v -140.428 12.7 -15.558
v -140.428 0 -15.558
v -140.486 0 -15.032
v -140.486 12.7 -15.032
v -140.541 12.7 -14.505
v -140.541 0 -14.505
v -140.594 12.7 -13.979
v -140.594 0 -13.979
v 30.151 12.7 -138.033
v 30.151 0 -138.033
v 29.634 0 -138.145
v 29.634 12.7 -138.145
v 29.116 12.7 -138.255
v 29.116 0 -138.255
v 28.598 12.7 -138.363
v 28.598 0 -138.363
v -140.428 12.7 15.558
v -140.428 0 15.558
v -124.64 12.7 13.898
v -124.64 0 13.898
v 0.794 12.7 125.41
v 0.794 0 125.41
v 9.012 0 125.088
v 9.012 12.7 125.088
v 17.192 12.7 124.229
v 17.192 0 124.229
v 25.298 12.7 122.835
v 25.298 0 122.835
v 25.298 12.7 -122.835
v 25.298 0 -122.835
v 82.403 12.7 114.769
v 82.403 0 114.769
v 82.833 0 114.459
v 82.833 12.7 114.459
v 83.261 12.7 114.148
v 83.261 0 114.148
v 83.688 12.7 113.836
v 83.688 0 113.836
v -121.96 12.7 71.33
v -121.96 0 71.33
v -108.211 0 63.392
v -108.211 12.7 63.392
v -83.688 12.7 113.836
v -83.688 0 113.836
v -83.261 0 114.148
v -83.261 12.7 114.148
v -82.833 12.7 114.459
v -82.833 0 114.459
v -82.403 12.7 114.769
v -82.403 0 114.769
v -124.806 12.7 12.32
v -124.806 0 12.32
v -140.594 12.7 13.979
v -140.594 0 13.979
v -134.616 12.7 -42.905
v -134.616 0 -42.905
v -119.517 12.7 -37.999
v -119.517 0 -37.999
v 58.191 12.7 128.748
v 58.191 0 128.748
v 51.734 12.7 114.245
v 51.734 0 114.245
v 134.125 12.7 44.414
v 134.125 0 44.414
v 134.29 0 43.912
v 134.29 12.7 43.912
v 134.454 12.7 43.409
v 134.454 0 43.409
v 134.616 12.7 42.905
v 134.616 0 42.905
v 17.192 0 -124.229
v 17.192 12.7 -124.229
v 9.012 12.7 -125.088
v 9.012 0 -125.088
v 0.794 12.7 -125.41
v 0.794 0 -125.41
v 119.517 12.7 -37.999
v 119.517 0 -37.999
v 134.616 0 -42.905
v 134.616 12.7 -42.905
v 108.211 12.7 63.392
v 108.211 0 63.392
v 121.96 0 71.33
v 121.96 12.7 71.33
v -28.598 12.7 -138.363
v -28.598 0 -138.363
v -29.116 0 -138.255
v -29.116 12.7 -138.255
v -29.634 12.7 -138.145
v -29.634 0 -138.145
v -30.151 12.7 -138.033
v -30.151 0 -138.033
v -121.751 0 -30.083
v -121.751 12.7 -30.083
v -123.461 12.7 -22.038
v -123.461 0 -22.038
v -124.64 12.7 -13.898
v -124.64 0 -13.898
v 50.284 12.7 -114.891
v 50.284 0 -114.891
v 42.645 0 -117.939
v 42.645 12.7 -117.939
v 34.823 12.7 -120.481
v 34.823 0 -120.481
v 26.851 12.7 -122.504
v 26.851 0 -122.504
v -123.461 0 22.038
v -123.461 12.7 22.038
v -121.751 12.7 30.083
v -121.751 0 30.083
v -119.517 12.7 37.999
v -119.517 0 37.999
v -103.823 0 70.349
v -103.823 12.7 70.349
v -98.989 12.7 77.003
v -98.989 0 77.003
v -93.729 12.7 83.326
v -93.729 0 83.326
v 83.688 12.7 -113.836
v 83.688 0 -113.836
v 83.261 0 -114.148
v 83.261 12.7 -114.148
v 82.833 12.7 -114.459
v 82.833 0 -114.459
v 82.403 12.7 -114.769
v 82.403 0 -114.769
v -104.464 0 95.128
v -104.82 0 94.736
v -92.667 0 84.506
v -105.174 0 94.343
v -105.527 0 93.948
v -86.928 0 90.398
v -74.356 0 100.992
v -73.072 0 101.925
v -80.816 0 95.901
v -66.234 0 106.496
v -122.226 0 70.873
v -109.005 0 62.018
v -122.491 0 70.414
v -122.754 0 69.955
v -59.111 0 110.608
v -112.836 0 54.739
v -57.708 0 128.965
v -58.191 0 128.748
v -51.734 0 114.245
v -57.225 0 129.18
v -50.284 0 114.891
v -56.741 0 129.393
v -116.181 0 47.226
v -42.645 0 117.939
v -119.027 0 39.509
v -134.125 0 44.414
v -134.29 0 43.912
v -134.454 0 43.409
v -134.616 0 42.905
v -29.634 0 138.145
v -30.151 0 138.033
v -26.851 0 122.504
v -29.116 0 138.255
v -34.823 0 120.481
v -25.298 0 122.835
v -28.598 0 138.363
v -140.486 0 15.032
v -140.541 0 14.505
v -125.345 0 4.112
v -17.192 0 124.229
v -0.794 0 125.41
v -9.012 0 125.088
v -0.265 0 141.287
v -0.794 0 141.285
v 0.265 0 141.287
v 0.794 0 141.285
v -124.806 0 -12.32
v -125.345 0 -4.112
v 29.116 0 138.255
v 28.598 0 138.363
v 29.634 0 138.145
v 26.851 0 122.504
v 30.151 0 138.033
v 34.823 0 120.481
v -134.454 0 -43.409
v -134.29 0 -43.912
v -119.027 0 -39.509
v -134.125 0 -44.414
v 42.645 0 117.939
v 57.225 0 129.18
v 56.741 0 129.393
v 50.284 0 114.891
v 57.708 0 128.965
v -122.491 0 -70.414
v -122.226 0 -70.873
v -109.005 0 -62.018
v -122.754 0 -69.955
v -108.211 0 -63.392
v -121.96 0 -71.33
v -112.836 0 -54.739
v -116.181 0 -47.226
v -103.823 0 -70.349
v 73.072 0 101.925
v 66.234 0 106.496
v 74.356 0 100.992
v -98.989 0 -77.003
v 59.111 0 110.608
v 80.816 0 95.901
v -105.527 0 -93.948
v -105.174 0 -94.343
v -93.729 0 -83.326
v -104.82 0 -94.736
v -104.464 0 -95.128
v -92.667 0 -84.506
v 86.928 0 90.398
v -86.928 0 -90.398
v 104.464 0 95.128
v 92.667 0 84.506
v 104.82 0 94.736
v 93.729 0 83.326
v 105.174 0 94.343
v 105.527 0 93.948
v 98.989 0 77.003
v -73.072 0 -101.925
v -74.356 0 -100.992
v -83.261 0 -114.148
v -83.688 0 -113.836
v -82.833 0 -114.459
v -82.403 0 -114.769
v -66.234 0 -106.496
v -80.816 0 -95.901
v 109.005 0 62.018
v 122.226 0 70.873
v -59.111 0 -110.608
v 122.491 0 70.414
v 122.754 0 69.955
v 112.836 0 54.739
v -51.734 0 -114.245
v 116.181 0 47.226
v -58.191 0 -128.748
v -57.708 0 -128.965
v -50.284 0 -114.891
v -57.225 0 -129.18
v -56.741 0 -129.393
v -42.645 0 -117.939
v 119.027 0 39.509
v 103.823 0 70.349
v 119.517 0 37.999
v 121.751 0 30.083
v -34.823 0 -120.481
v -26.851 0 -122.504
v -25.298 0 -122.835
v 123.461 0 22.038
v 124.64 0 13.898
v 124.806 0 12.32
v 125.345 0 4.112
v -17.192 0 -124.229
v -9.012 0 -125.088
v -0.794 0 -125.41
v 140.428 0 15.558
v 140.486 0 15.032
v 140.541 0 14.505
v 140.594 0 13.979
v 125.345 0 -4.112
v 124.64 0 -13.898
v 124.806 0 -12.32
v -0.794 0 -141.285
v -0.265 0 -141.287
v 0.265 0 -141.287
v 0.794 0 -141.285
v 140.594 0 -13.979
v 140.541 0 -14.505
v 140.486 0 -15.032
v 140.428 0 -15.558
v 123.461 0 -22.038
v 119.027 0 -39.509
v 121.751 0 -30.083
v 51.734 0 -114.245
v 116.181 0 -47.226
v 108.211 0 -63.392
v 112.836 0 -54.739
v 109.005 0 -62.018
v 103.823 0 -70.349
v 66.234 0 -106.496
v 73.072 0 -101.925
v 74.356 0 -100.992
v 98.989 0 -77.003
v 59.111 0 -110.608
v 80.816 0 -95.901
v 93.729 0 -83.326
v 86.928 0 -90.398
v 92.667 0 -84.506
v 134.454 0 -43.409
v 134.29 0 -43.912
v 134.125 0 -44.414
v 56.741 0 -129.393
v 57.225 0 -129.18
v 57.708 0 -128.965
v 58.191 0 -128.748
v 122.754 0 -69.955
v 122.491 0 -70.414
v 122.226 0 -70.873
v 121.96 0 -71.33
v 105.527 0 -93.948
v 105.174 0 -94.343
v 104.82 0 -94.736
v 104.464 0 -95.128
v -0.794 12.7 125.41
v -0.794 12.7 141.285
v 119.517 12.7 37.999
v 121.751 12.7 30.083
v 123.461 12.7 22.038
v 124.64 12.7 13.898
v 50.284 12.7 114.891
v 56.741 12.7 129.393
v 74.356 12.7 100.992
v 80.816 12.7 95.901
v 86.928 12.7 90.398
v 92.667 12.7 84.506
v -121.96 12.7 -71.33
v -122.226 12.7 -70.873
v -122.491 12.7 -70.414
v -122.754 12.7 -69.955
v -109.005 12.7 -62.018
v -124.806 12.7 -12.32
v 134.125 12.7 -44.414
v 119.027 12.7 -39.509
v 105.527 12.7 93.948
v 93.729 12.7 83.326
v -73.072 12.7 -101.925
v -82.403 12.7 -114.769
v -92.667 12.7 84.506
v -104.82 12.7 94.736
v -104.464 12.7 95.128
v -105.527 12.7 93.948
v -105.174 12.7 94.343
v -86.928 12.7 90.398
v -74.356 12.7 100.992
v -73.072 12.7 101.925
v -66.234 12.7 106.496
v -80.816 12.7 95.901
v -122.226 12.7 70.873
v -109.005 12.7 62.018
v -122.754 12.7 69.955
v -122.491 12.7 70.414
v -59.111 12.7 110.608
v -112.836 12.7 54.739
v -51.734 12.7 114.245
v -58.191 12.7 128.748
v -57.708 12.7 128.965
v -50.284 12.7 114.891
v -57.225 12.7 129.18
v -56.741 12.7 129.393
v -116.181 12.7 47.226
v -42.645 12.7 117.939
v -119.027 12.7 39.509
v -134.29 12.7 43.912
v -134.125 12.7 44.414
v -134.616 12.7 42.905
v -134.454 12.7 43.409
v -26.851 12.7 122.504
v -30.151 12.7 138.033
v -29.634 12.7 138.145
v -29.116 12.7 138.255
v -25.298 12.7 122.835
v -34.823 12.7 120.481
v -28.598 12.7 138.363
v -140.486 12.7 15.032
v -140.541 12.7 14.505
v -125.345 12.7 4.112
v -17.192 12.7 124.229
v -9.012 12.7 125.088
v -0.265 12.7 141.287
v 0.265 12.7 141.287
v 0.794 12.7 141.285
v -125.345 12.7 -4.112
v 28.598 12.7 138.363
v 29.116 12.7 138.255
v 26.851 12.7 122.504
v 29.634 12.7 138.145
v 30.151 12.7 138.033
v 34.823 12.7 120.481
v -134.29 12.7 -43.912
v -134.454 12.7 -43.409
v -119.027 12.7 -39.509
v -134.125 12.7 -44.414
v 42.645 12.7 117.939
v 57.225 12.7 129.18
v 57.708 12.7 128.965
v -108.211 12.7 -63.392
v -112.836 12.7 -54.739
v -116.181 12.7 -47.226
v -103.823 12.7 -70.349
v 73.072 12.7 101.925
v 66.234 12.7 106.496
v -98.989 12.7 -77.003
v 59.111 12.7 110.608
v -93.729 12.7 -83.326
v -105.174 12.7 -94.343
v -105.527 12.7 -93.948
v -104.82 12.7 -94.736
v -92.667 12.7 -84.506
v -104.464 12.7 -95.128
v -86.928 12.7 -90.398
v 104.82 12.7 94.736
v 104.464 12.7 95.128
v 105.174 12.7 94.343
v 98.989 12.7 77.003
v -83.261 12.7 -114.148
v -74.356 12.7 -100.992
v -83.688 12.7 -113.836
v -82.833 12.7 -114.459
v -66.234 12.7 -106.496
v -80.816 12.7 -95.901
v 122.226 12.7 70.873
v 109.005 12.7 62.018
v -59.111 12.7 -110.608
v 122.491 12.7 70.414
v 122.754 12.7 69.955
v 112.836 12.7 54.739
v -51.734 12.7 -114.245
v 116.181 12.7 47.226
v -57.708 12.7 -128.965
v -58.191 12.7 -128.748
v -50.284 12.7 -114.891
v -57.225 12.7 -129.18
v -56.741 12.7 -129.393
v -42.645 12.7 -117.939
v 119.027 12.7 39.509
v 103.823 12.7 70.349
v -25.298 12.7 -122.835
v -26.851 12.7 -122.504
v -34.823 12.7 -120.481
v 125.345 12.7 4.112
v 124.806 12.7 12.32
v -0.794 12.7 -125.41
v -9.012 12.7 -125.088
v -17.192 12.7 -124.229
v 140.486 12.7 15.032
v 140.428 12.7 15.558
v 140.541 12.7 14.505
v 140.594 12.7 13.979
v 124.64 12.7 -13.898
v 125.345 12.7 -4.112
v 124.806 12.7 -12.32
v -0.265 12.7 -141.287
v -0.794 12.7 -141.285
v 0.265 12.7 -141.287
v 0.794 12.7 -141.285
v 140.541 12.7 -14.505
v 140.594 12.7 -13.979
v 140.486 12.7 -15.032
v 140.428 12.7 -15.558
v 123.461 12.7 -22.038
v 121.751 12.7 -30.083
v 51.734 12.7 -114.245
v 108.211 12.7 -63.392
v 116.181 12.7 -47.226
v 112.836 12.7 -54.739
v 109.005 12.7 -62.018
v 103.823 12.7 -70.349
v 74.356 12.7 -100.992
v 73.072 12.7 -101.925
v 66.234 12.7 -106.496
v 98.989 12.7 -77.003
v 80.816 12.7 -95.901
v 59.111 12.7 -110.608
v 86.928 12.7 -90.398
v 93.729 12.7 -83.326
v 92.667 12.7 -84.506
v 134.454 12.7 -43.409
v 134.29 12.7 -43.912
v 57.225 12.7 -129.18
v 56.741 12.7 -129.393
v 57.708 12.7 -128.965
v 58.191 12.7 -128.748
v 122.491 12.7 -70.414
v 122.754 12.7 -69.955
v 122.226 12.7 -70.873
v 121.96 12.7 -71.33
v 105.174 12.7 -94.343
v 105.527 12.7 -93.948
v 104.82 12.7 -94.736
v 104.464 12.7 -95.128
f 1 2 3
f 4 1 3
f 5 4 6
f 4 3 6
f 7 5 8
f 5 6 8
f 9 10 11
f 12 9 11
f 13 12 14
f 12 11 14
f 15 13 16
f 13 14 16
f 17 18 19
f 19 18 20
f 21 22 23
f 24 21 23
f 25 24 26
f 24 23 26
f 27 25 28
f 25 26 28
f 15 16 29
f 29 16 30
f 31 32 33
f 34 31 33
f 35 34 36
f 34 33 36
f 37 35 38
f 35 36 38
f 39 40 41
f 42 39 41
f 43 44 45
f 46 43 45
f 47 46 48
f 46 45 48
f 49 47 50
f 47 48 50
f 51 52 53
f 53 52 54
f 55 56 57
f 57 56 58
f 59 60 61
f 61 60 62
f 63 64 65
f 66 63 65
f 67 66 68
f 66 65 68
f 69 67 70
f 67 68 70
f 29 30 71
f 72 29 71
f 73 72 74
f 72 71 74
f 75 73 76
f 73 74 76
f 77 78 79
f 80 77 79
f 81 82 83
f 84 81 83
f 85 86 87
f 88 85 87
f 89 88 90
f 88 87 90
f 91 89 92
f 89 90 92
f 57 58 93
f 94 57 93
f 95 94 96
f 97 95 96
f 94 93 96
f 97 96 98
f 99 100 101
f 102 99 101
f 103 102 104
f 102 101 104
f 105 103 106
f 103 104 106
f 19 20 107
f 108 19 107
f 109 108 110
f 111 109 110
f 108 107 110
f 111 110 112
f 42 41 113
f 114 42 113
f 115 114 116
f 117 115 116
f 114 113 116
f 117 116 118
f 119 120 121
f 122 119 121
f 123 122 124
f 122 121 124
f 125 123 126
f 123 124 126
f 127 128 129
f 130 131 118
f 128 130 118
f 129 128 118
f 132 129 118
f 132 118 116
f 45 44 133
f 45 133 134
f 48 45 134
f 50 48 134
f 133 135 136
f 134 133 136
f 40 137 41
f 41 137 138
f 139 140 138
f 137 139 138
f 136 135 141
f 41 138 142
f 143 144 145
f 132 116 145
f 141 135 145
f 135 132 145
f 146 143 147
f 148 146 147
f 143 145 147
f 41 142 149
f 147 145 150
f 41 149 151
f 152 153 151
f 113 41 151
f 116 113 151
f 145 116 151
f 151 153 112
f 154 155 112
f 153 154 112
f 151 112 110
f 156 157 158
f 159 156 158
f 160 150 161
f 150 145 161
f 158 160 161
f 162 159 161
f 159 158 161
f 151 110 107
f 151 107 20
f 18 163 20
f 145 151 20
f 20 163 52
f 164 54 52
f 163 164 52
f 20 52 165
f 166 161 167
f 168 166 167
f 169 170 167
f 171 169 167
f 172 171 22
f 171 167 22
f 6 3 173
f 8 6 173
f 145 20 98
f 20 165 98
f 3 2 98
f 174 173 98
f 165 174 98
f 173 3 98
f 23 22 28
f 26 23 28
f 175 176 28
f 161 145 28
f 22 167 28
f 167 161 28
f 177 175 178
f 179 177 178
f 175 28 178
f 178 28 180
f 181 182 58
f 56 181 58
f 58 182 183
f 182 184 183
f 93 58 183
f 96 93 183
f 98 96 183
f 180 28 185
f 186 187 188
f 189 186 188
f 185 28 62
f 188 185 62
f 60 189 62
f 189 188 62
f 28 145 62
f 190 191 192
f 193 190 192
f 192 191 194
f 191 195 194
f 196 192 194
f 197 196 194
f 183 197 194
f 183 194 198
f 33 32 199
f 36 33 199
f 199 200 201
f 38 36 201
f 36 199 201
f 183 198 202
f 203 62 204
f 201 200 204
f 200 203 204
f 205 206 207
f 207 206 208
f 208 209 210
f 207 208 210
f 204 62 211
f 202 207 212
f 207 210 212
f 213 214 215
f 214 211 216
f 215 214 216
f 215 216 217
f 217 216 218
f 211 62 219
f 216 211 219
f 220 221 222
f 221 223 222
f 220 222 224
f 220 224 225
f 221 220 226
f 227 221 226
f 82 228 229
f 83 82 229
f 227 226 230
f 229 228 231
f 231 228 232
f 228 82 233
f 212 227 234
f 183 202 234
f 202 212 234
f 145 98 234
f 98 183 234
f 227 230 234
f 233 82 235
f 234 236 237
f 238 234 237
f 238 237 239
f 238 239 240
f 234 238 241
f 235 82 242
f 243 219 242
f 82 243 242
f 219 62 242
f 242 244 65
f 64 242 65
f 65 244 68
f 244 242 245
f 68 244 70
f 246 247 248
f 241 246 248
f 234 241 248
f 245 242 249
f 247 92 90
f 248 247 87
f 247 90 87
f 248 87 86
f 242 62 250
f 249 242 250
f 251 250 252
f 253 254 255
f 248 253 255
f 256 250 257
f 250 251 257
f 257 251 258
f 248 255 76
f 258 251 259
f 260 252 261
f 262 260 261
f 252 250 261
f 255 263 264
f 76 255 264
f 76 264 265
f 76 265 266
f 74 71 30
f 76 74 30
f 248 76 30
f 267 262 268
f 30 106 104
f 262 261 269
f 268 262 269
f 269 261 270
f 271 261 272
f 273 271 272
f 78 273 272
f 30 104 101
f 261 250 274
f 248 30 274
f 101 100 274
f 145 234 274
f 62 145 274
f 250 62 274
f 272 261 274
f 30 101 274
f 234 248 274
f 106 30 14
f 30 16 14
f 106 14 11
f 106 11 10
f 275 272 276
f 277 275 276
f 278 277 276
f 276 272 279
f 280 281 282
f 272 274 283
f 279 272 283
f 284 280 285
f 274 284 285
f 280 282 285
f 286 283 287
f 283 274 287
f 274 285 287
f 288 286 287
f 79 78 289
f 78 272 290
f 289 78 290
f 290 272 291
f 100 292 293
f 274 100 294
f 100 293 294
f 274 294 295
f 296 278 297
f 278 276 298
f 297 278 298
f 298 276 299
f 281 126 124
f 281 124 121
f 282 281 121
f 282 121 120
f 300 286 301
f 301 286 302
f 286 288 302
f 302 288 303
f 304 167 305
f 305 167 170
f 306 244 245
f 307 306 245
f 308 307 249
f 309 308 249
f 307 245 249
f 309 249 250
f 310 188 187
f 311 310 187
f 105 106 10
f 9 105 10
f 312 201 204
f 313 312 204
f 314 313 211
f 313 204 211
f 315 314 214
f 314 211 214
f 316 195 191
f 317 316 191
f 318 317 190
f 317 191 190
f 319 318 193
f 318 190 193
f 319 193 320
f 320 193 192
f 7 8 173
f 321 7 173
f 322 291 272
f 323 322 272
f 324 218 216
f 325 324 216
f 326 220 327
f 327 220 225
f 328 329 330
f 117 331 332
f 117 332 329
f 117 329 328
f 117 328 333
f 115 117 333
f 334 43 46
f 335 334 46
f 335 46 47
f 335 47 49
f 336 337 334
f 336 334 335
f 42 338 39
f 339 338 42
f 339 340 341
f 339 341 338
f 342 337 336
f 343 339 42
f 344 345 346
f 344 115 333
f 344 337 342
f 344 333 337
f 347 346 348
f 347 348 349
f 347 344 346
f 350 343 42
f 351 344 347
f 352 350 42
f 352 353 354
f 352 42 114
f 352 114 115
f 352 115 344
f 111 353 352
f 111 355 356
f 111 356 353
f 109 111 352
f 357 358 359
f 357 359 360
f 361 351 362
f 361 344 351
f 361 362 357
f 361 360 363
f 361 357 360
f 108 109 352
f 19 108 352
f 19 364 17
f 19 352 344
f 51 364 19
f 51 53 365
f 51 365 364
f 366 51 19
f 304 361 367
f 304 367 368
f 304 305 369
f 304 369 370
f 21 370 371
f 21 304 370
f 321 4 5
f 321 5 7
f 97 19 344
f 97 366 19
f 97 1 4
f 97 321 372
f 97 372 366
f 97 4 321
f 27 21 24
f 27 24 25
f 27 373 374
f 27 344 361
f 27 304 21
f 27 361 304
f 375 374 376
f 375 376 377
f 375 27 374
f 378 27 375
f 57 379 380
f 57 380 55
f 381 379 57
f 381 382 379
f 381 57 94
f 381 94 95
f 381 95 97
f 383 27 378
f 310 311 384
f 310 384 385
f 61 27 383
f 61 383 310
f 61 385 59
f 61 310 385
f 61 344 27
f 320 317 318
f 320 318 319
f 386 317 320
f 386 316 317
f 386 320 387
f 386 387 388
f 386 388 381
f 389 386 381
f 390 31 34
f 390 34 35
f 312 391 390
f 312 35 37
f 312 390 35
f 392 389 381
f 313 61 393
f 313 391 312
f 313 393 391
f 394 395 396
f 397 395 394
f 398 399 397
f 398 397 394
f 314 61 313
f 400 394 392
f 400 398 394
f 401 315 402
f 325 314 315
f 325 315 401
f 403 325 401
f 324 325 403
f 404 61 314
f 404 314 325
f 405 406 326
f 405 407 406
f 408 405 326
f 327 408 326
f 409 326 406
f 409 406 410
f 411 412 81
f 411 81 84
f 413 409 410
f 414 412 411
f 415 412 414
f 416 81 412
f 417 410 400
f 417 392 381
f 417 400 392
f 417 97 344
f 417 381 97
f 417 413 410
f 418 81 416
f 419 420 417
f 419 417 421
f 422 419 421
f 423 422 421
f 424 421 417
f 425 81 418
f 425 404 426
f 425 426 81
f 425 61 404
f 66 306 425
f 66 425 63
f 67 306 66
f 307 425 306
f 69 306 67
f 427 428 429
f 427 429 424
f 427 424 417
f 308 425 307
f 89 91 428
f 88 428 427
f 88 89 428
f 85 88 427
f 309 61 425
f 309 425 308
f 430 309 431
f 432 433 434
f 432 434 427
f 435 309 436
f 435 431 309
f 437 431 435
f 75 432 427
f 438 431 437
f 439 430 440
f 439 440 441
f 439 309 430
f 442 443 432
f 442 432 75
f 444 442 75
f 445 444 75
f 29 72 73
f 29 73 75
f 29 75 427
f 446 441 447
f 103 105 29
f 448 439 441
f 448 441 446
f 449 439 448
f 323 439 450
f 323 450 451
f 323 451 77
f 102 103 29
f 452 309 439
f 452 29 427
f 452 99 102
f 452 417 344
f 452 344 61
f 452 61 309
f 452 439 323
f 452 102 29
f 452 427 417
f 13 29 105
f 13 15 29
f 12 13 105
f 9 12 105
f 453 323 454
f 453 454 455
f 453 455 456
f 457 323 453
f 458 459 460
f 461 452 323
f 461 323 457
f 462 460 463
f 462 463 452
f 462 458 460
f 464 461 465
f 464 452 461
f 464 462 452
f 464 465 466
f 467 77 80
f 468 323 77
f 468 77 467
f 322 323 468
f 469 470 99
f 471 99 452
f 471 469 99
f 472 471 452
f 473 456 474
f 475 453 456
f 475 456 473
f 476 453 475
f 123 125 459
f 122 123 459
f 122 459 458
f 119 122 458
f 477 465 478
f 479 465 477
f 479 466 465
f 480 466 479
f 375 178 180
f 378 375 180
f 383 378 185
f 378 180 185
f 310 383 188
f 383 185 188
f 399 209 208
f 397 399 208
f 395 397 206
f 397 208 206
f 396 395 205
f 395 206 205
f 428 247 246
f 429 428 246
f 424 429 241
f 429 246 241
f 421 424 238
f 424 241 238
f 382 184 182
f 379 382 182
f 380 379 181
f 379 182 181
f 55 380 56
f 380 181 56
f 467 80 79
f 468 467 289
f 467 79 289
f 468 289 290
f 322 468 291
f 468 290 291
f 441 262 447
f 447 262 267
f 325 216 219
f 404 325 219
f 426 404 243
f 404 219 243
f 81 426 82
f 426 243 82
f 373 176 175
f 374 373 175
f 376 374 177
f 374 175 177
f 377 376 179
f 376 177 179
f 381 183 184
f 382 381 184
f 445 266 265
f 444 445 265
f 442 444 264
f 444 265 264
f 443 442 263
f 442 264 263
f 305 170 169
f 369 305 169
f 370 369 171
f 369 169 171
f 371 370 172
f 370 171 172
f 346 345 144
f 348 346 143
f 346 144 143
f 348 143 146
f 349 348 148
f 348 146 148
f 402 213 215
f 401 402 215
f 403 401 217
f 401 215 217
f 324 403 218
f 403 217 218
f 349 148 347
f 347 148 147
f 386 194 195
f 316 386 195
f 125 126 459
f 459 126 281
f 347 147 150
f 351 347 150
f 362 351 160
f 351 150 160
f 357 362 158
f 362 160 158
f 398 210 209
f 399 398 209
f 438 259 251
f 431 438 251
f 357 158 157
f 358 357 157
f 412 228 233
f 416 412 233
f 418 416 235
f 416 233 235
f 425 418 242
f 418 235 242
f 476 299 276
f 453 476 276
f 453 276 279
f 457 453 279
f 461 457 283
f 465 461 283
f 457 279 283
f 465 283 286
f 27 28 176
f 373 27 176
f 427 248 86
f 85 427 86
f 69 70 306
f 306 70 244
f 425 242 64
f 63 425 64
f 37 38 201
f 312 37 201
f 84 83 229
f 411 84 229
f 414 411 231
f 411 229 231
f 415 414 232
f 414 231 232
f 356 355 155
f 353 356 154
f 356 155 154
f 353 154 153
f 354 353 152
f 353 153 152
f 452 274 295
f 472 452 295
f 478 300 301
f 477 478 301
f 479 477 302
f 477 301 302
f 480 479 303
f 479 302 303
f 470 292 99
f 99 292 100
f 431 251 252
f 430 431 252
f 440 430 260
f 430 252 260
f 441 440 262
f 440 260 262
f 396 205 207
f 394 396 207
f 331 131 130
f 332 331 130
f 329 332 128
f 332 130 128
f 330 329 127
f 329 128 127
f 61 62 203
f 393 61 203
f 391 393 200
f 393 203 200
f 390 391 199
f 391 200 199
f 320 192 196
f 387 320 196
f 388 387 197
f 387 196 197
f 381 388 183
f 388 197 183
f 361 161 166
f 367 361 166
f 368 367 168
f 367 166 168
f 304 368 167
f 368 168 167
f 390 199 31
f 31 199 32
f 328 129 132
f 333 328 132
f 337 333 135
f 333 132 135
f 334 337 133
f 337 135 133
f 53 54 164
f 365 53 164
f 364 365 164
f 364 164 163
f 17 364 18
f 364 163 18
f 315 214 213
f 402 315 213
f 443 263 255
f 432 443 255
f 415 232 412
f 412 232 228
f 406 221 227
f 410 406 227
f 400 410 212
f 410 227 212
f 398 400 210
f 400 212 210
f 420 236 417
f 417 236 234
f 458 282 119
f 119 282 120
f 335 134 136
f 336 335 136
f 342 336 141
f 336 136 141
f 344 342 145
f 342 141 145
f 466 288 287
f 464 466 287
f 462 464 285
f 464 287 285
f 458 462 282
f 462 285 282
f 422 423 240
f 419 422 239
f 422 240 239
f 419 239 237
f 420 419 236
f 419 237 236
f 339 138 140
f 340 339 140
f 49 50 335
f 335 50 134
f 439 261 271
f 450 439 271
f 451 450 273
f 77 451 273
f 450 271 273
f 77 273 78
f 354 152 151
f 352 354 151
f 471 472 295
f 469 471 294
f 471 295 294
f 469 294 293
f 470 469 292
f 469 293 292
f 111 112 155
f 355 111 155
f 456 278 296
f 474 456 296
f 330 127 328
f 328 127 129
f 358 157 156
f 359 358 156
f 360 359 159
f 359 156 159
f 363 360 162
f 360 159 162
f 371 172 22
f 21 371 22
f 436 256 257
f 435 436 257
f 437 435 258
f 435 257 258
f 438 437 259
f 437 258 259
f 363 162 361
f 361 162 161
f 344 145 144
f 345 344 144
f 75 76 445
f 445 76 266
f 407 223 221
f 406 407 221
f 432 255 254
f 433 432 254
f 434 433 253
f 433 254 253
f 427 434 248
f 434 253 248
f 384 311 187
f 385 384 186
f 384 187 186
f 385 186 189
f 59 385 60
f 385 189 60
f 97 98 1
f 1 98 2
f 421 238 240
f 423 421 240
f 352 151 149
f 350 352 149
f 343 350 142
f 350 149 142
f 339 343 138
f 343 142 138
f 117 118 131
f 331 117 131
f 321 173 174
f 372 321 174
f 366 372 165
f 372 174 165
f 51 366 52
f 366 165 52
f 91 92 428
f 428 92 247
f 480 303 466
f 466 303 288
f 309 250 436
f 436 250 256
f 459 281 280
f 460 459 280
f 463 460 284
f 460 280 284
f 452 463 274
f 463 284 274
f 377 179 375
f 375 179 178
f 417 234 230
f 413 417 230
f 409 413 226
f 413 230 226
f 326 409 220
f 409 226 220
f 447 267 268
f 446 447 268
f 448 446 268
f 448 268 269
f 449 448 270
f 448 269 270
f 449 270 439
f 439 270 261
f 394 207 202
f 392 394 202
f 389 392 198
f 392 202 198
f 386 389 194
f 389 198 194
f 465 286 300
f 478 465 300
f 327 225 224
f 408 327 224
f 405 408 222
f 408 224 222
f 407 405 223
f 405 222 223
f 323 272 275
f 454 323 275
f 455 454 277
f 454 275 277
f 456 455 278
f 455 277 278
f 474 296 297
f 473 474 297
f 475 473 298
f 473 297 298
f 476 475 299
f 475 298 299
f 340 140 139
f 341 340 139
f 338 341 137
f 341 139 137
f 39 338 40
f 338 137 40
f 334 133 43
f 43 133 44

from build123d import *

# Parameters (mm, degrees)
BOSS_EXTRUDE1_DEPTH = 12.7


with BuildPart() as part:
    # Sketch3 → Boss-Extrude1 (new body)
    with BuildSketch(Plane(origin=(0, 0, 0), x_dir=(1, 0, 0), z_dir=(0, 1, 0))):
        with BuildLine():
            Line((-0.79375, 141.285270348), (-0.79375, 125.409988108))
            ThreePointArc((-0.79375, 125.409988108), (-13.1091759, 124.725477203), (-25.297798015, 122.83450888))
            Line((-25.297798015, 122.83450888), (-28.598454788, 138.362878114))
            ThreePointArc((-28.598454788, 138.362878114), (-29.375323016, 138.200029139), (-30.151264104, 138.032818305))
            Line((-30.151264104, 138.032818305), (-26.850607331, 122.504449071))
            ThreePointArc((-26.850607331, 122.504449071), (-38.754593807, 119.27437535), (-50.283710864, 114.890572189))
            Line((-50.283710864, 114.890572189), (-56.74076987, 129.393364168))
            ThreePointArc((-56.74076987, 129.393364168), (-57.466803459, 129.072553847), (-58.191023284, 128.747669747))
            Line((-58.191023284, 128.747669747), (-51.733964278, 114.244877768))
            ThreePointArc((-51.733964278, 114.244877768), (-62.70625, 108.610410952), (-73.071984261, 101.925366188))
            Line((-73.071984261, 101.925366188), (-82.403241037, 114.76873931))
            ThreePointArc((-82.403241037, 114.76873931), (-83.046708833, 114.303988593), (-83.687555516, 113.835630222))
            Line((-83.687555516, 113.835630222), (-74.356298739, 100.9922571))
            ThreePointArc((-74.356298739, 100.9922571), (-83.91734217, 93.199650425), (-92.666661307, 84.505532591))
            Line((-92.666661307, 84.505532591), (-104.464295156, 95.128169822))
            ThreePointArc((-104.464295156, 95.128169822), (-104.99707453, 94.539790546), (-105.526539994, 93.948427412))
            Line((-105.526539994, 93.948427412), (-93.728906144, 83.325790181))
            ThreePointArc((-93.728906144, 83.325790181), (-101.460843807, 73.715617953), (-108.21136059, 63.392401718))
            Line((-108.21136059, 63.392401718), (-121.959758302, 71.330042838))
            ThreePointArc((-121.959758302, 71.330042838), (-122.358564237, 70.64375), (-122.753508302, 69.95522751))
            Line((-122.753508302, 69.95522751), (-109.00511059, 62.01758639))
            ThreePointArc((-109.00511059, 62.01758639), (-114.570019707, 51.00985925), (-119.026704159, 39.508718699))
            Line((-119.026704159, 39.508718699), (-134.124994781, 44.414450702))
            ThreePointArc((-134.124994781, 44.414450702), (-134.372397546, 43.660238593), (-134.61555926, 42.904648482))
            Line((-134.61555926, 42.904648482), (-119.517268638, 37.99891648))
            ThreePointArc((-119.517268638, 37.99891648), (-122.671935977, 26.074724925), (-124.640009603, 13.89831509))
            Line((-124.640009603, 13.89831509), (-140.428325386, 15.557733946))
            ThreePointArc((-140.428325386, 15.557733946), (-140.513512292, 14.768565254), (-140.594264321, 13.978930437))
            Line((-140.594264321, 13.978930437), (-124.805948539, 12.319511581))
            ThreePointArc((-124.805948539, 12.319511581), (-125.4125, 0), (-124.805948539, -12.319511581))
            Line((-124.805948539, -12.319511581), (-140.594264321, -13.978930437))
            ThreePointArc((-140.594264321, -13.978930437), (-140.513512292, -14.768565254), (-140.428325386, -15.557733946))
            Line((-140.428325386, -15.557733946), (-124.640009603, -13.89831509))
            ThreePointArc((-124.640009603, -13.89831509), (-122.671935977, -26.074724925), (-119.517268638, -37.99891648))
            Line((-119.517268638, -37.99891648), (-134.61555926, -42.904648482))
            ThreePointArc((-134.61555926, -42.904648482), (-134.372397546, -43.660238593), (-134.124994781, -44.414450702))
            Line((-134.124994781, -44.414450702), (-119.026704159, -39.508718699))
            ThreePointArc((-119.026704159, -39.508718699), (-114.570019707, -51.00985925), (-109.00511059, -62.01758639))
            Line((-109.00511059, -62.01758639), (-122.753508302, -69.95522751))
            ThreePointArc((-122.753508302, -69.95522751), (-122.358564237, -70.64375), (-121.959758302, -71.330042838))
            Line((-121.959758302, -71.330042838), (-108.21136059, -63.392401718))
            ThreePointArc((-108.21136059, -63.392401718), (-101.460843807, -73.715617953), (-93.728906144, -83.325790181))
            Line((-93.728906144, -83.325790181), (-105.526539994, -93.948427412))
            ThreePointArc((-105.526539994, -93.948427412), (-104.99707453, -94.539790546), (-104.464295156, -95.128169822))
            Line((-104.464295156, -95.128169822), (-92.666661307, -84.505532591))
            ThreePointArc((-92.666661307, -84.505532591), (-83.91734217, -93.199650425), (-74.356298739, -100.9922571))
            Line((-74.356298739, -100.9922571), (-83.687555516, -113.835630222))
            ThreePointArc((-83.687555516, -113.835630222), (-83.046708833, -114.303988593), (-82.403241037, -114.76873931))
            Line((-82.403241037, -114.76873931), (-73.071984261, -101.925366188))
            ThreePointArc((-73.071984261, -101.925366188), (-62.70625, -108.610410952), (-51.733964278, -114.244877768))
            Line((-51.733964278, -114.244877768), (-58.191023284, -128.747669747))
            ThreePointArc((-58.191023284, -128.747669747), (-57.466803459, -129.072553847), (-56.74076987, -129.393364168))
            Line((-56.74076987, -129.393364168), (-50.283710864, -114.890572189))
            ThreePointArc((-50.283710864, -114.890572189), (-38.754593807, -119.27437535), (-26.850607331, -122.504449071))
            Line((-26.850607331, -122.504449071), (-30.151264104, -138.032818305))
            ThreePointArc((-30.151264104, -138.032818305), (-29.375323016, -138.200029139), (-28.598454788, -138.362878114))
            Line((-28.598454788, -138.362878114), (-25.297798015, -122.83450888))
            ThreePointArc((-25.297798015, -122.83450888), (-13.1091759, -124.725477203), (-0.79375, -125.409988108))
            Line((-0.79375, -125.409988108), (-0.79375, -141.285270348))
            ThreePointArc((-0.79375, -141.285270348), (0, -141.2875), (0.79375, -141.285270348))
            Line((0.79375, -141.285270348), (0.79375, -125.409988108))
            ThreePointArc((0.79375, -125.409988108), (13.1091759, -124.725477203), (25.297798015, -122.83450888))
            Line((25.297798015, -122.83450888), (28.598454788, -138.362878114))
            ThreePointArc((28.598454788, -138.362878114), (29.375323016, -138.200029139), (30.151264104, -138.032818305))
            Line((30.151264104, -138.032818305), (26.850607331, -122.504449071))
            ThreePointArc((26.850607331, -122.504449071), (38.754593807, -119.27437535), (50.283710864, -114.890572189))
            Line((50.283710864, -114.890572189), (56.74076987, -129.393364168))
            ThreePointArc((56.74076987, -129.393364168), (57.466803459, -129.072553847), (58.191023284, -128.747669747))
            Line((58.191023284, -128.747669747), (51.733964278, -114.244877768))
            ThreePointArc((51.733964278, -114.244877768), (62.70625, -108.610410952), (73.071984261, -101.925366188))
            Line((73.071984261, -101.925366188), (82.403241037, -114.76873931))
            ThreePointArc((82.403241037, -114.76873931), (83.046708833, -114.303988593), (83.687555516, -113.835630222))
            Line((83.687555516, -113.835630222), (74.356298739, -100.9922571))
            ThreePointArc((74.356298739, -100.9922571), (83.91734217, -93.199650425), (92.666661307, -84.505532591))
            Line((92.666661307, -84.505532591), (104.464295156, -95.128169822))
            ThreePointArc((104.464295156, -95.128169822), (104.99707453, -94.539790546), (105.526539994, -93.948427412))
            Line((105.526539994, -93.948427412), (93.728906144, -83.325790181))
            ThreePointArc((93.728906144, -83.325790181), (101.460843807, -73.715617953), (108.21136059, -63.392401718))
            Line((108.21136059, -63.392401718), (121.959758302, -71.330042838))
            ThreePointArc((121.959758302, -71.330042838), (122.358564237, -70.64375), (122.753508302, -69.95522751))
            Line((122.753508302, -69.95522751), (109.00511059, -62.01758639))
            ThreePointArc((109.00511059, -62.01758639), (114.570019707, -51.00985925), (119.026704159, -39.508718699))
            Line((119.026704159, -39.508718699), (134.124994781, -44.414450702))
            ThreePointArc((134.124994781, -44.414450702), (134.372397546, -43.660238593), (134.61555926, -42.904648482))
            Line((134.61555926, -42.904648482), (119.517268638, -37.99891648))
            ThreePointArc((119.517268638, -37.99891648), (122.671935977, -26.074724925), (124.640009603, -13.89831509))
            Line((124.640009603, -13.89831509), (140.428325386, -15.557733946))
            ThreePointArc((140.428325386, -15.557733946), (140.513512292, -14.768565254), (140.594264321, -13.978930437))
            Line((140.594264321, -13.978930437), (124.805948539, -12.319511581))
            ThreePointArc((124.805948539, -12.319511581), (125.4125, 0), (124.805948539, 12.319511581))
            Line((124.805948539, 12.319511581), (140.594264321, 13.978930437))
            ThreePointArc((140.594264321, 13.978930437), (140.513512292, 14.768565254), (140.428325386, 15.557733946))
            Line((140.428325386, 15.557733946), (124.640009603, 13.89831509))
            ThreePointArc((124.640009603, 13.89831509), (122.671935977, 26.074724925), (119.517268638, 37.99891648))
            Line((119.517268638, 37.99891648), (134.61555926, 42.904648482))
            ThreePointArc((134.61555926, 42.904648482), (134.372397546, 43.660238593), (134.124994781, 44.414450702))
            Line((134.124994781, 44.414450702), (119.026704159, 39.508718699))
            ThreePointArc((119.026704159, 39.508718699), (114.570019707, 51.00985925), (109.00511059, 62.01758639))
            Line((109.00511059, 62.01758639), (122.753508302, 69.95522751))
            ThreePointArc((122.753508302, 69.95522751), (122.358564237, 70.64375), (121.959758302, 71.330042838))
            Line((121.959758302, 71.330042838), (108.21136059, 63.392401718))
            ThreePointArc((108.21136059, 63.392401718), (101.460843807, 73.715617953), (93.728906144, 83.325790181))
            Line((93.728906144, 83.325790181), (105.526539994, 93.948427412))
            ThreePointArc((105.526539994, 93.948427412), (104.99707453, 94.539790546), (104.464295156, 95.128169822))
            Line((104.464295156, 95.128169822), (92.666661307, 84.505532591))
            ThreePointArc((92.666661307, 84.505532591), (83.91734217, 93.199650425), (74.356298739, 100.9922571))
            Line((74.356298739, 100.9922571), (83.687555516, 113.835630222))
            ThreePointArc((83.687555516, 113.835630222), (83.046708833, 114.303988593), (82.403241037, 114.76873931))
            Line((82.403241037, 114.76873931), (73.071984261, 101.925366188))
            ThreePointArc((73.071984261, 101.925366188), (62.70625, 108.610410952), (51.733964278, 114.244877768))
            Line((51.733964278, 114.244877768), (58.191023284, 128.747669747))
            ThreePointArc((58.191023284, 128.747669747), (57.466803459, 129.072553847), (56.74076987, 129.393364168))
            Line((56.74076987, 129.393364168), (50.283710864, 114.890572189))
            ThreePointArc((50.283710864, 114.890572189), (38.754593807, 119.27437535), (26.850607331, 122.504449071))
            Line((26.850607331, 122.504449071), (30.151264104, 138.032818305))
            ThreePointArc((30.151264104, 138.032818305), (29.375323016, 138.200029139), (28.598454788, 138.362878114))
            Line((28.598454788, 138.362878114), (25.297798015, 122.83450888))
            ThreePointArc((25.297798015, 122.83450888), (13.1091759, 124.725477203), (0.79375, 125.409988108))
            Line((0.79375, 125.409988108), (0.79375, 141.285270348))
            ThreePointArc((0.79375, 141.285270348), (0, 141.2875), (-0.79375, 141.285270348))
        make_face()
    extrude(amount=BOSS_EXTRUDE1_DEPTH)


solid = part.part
